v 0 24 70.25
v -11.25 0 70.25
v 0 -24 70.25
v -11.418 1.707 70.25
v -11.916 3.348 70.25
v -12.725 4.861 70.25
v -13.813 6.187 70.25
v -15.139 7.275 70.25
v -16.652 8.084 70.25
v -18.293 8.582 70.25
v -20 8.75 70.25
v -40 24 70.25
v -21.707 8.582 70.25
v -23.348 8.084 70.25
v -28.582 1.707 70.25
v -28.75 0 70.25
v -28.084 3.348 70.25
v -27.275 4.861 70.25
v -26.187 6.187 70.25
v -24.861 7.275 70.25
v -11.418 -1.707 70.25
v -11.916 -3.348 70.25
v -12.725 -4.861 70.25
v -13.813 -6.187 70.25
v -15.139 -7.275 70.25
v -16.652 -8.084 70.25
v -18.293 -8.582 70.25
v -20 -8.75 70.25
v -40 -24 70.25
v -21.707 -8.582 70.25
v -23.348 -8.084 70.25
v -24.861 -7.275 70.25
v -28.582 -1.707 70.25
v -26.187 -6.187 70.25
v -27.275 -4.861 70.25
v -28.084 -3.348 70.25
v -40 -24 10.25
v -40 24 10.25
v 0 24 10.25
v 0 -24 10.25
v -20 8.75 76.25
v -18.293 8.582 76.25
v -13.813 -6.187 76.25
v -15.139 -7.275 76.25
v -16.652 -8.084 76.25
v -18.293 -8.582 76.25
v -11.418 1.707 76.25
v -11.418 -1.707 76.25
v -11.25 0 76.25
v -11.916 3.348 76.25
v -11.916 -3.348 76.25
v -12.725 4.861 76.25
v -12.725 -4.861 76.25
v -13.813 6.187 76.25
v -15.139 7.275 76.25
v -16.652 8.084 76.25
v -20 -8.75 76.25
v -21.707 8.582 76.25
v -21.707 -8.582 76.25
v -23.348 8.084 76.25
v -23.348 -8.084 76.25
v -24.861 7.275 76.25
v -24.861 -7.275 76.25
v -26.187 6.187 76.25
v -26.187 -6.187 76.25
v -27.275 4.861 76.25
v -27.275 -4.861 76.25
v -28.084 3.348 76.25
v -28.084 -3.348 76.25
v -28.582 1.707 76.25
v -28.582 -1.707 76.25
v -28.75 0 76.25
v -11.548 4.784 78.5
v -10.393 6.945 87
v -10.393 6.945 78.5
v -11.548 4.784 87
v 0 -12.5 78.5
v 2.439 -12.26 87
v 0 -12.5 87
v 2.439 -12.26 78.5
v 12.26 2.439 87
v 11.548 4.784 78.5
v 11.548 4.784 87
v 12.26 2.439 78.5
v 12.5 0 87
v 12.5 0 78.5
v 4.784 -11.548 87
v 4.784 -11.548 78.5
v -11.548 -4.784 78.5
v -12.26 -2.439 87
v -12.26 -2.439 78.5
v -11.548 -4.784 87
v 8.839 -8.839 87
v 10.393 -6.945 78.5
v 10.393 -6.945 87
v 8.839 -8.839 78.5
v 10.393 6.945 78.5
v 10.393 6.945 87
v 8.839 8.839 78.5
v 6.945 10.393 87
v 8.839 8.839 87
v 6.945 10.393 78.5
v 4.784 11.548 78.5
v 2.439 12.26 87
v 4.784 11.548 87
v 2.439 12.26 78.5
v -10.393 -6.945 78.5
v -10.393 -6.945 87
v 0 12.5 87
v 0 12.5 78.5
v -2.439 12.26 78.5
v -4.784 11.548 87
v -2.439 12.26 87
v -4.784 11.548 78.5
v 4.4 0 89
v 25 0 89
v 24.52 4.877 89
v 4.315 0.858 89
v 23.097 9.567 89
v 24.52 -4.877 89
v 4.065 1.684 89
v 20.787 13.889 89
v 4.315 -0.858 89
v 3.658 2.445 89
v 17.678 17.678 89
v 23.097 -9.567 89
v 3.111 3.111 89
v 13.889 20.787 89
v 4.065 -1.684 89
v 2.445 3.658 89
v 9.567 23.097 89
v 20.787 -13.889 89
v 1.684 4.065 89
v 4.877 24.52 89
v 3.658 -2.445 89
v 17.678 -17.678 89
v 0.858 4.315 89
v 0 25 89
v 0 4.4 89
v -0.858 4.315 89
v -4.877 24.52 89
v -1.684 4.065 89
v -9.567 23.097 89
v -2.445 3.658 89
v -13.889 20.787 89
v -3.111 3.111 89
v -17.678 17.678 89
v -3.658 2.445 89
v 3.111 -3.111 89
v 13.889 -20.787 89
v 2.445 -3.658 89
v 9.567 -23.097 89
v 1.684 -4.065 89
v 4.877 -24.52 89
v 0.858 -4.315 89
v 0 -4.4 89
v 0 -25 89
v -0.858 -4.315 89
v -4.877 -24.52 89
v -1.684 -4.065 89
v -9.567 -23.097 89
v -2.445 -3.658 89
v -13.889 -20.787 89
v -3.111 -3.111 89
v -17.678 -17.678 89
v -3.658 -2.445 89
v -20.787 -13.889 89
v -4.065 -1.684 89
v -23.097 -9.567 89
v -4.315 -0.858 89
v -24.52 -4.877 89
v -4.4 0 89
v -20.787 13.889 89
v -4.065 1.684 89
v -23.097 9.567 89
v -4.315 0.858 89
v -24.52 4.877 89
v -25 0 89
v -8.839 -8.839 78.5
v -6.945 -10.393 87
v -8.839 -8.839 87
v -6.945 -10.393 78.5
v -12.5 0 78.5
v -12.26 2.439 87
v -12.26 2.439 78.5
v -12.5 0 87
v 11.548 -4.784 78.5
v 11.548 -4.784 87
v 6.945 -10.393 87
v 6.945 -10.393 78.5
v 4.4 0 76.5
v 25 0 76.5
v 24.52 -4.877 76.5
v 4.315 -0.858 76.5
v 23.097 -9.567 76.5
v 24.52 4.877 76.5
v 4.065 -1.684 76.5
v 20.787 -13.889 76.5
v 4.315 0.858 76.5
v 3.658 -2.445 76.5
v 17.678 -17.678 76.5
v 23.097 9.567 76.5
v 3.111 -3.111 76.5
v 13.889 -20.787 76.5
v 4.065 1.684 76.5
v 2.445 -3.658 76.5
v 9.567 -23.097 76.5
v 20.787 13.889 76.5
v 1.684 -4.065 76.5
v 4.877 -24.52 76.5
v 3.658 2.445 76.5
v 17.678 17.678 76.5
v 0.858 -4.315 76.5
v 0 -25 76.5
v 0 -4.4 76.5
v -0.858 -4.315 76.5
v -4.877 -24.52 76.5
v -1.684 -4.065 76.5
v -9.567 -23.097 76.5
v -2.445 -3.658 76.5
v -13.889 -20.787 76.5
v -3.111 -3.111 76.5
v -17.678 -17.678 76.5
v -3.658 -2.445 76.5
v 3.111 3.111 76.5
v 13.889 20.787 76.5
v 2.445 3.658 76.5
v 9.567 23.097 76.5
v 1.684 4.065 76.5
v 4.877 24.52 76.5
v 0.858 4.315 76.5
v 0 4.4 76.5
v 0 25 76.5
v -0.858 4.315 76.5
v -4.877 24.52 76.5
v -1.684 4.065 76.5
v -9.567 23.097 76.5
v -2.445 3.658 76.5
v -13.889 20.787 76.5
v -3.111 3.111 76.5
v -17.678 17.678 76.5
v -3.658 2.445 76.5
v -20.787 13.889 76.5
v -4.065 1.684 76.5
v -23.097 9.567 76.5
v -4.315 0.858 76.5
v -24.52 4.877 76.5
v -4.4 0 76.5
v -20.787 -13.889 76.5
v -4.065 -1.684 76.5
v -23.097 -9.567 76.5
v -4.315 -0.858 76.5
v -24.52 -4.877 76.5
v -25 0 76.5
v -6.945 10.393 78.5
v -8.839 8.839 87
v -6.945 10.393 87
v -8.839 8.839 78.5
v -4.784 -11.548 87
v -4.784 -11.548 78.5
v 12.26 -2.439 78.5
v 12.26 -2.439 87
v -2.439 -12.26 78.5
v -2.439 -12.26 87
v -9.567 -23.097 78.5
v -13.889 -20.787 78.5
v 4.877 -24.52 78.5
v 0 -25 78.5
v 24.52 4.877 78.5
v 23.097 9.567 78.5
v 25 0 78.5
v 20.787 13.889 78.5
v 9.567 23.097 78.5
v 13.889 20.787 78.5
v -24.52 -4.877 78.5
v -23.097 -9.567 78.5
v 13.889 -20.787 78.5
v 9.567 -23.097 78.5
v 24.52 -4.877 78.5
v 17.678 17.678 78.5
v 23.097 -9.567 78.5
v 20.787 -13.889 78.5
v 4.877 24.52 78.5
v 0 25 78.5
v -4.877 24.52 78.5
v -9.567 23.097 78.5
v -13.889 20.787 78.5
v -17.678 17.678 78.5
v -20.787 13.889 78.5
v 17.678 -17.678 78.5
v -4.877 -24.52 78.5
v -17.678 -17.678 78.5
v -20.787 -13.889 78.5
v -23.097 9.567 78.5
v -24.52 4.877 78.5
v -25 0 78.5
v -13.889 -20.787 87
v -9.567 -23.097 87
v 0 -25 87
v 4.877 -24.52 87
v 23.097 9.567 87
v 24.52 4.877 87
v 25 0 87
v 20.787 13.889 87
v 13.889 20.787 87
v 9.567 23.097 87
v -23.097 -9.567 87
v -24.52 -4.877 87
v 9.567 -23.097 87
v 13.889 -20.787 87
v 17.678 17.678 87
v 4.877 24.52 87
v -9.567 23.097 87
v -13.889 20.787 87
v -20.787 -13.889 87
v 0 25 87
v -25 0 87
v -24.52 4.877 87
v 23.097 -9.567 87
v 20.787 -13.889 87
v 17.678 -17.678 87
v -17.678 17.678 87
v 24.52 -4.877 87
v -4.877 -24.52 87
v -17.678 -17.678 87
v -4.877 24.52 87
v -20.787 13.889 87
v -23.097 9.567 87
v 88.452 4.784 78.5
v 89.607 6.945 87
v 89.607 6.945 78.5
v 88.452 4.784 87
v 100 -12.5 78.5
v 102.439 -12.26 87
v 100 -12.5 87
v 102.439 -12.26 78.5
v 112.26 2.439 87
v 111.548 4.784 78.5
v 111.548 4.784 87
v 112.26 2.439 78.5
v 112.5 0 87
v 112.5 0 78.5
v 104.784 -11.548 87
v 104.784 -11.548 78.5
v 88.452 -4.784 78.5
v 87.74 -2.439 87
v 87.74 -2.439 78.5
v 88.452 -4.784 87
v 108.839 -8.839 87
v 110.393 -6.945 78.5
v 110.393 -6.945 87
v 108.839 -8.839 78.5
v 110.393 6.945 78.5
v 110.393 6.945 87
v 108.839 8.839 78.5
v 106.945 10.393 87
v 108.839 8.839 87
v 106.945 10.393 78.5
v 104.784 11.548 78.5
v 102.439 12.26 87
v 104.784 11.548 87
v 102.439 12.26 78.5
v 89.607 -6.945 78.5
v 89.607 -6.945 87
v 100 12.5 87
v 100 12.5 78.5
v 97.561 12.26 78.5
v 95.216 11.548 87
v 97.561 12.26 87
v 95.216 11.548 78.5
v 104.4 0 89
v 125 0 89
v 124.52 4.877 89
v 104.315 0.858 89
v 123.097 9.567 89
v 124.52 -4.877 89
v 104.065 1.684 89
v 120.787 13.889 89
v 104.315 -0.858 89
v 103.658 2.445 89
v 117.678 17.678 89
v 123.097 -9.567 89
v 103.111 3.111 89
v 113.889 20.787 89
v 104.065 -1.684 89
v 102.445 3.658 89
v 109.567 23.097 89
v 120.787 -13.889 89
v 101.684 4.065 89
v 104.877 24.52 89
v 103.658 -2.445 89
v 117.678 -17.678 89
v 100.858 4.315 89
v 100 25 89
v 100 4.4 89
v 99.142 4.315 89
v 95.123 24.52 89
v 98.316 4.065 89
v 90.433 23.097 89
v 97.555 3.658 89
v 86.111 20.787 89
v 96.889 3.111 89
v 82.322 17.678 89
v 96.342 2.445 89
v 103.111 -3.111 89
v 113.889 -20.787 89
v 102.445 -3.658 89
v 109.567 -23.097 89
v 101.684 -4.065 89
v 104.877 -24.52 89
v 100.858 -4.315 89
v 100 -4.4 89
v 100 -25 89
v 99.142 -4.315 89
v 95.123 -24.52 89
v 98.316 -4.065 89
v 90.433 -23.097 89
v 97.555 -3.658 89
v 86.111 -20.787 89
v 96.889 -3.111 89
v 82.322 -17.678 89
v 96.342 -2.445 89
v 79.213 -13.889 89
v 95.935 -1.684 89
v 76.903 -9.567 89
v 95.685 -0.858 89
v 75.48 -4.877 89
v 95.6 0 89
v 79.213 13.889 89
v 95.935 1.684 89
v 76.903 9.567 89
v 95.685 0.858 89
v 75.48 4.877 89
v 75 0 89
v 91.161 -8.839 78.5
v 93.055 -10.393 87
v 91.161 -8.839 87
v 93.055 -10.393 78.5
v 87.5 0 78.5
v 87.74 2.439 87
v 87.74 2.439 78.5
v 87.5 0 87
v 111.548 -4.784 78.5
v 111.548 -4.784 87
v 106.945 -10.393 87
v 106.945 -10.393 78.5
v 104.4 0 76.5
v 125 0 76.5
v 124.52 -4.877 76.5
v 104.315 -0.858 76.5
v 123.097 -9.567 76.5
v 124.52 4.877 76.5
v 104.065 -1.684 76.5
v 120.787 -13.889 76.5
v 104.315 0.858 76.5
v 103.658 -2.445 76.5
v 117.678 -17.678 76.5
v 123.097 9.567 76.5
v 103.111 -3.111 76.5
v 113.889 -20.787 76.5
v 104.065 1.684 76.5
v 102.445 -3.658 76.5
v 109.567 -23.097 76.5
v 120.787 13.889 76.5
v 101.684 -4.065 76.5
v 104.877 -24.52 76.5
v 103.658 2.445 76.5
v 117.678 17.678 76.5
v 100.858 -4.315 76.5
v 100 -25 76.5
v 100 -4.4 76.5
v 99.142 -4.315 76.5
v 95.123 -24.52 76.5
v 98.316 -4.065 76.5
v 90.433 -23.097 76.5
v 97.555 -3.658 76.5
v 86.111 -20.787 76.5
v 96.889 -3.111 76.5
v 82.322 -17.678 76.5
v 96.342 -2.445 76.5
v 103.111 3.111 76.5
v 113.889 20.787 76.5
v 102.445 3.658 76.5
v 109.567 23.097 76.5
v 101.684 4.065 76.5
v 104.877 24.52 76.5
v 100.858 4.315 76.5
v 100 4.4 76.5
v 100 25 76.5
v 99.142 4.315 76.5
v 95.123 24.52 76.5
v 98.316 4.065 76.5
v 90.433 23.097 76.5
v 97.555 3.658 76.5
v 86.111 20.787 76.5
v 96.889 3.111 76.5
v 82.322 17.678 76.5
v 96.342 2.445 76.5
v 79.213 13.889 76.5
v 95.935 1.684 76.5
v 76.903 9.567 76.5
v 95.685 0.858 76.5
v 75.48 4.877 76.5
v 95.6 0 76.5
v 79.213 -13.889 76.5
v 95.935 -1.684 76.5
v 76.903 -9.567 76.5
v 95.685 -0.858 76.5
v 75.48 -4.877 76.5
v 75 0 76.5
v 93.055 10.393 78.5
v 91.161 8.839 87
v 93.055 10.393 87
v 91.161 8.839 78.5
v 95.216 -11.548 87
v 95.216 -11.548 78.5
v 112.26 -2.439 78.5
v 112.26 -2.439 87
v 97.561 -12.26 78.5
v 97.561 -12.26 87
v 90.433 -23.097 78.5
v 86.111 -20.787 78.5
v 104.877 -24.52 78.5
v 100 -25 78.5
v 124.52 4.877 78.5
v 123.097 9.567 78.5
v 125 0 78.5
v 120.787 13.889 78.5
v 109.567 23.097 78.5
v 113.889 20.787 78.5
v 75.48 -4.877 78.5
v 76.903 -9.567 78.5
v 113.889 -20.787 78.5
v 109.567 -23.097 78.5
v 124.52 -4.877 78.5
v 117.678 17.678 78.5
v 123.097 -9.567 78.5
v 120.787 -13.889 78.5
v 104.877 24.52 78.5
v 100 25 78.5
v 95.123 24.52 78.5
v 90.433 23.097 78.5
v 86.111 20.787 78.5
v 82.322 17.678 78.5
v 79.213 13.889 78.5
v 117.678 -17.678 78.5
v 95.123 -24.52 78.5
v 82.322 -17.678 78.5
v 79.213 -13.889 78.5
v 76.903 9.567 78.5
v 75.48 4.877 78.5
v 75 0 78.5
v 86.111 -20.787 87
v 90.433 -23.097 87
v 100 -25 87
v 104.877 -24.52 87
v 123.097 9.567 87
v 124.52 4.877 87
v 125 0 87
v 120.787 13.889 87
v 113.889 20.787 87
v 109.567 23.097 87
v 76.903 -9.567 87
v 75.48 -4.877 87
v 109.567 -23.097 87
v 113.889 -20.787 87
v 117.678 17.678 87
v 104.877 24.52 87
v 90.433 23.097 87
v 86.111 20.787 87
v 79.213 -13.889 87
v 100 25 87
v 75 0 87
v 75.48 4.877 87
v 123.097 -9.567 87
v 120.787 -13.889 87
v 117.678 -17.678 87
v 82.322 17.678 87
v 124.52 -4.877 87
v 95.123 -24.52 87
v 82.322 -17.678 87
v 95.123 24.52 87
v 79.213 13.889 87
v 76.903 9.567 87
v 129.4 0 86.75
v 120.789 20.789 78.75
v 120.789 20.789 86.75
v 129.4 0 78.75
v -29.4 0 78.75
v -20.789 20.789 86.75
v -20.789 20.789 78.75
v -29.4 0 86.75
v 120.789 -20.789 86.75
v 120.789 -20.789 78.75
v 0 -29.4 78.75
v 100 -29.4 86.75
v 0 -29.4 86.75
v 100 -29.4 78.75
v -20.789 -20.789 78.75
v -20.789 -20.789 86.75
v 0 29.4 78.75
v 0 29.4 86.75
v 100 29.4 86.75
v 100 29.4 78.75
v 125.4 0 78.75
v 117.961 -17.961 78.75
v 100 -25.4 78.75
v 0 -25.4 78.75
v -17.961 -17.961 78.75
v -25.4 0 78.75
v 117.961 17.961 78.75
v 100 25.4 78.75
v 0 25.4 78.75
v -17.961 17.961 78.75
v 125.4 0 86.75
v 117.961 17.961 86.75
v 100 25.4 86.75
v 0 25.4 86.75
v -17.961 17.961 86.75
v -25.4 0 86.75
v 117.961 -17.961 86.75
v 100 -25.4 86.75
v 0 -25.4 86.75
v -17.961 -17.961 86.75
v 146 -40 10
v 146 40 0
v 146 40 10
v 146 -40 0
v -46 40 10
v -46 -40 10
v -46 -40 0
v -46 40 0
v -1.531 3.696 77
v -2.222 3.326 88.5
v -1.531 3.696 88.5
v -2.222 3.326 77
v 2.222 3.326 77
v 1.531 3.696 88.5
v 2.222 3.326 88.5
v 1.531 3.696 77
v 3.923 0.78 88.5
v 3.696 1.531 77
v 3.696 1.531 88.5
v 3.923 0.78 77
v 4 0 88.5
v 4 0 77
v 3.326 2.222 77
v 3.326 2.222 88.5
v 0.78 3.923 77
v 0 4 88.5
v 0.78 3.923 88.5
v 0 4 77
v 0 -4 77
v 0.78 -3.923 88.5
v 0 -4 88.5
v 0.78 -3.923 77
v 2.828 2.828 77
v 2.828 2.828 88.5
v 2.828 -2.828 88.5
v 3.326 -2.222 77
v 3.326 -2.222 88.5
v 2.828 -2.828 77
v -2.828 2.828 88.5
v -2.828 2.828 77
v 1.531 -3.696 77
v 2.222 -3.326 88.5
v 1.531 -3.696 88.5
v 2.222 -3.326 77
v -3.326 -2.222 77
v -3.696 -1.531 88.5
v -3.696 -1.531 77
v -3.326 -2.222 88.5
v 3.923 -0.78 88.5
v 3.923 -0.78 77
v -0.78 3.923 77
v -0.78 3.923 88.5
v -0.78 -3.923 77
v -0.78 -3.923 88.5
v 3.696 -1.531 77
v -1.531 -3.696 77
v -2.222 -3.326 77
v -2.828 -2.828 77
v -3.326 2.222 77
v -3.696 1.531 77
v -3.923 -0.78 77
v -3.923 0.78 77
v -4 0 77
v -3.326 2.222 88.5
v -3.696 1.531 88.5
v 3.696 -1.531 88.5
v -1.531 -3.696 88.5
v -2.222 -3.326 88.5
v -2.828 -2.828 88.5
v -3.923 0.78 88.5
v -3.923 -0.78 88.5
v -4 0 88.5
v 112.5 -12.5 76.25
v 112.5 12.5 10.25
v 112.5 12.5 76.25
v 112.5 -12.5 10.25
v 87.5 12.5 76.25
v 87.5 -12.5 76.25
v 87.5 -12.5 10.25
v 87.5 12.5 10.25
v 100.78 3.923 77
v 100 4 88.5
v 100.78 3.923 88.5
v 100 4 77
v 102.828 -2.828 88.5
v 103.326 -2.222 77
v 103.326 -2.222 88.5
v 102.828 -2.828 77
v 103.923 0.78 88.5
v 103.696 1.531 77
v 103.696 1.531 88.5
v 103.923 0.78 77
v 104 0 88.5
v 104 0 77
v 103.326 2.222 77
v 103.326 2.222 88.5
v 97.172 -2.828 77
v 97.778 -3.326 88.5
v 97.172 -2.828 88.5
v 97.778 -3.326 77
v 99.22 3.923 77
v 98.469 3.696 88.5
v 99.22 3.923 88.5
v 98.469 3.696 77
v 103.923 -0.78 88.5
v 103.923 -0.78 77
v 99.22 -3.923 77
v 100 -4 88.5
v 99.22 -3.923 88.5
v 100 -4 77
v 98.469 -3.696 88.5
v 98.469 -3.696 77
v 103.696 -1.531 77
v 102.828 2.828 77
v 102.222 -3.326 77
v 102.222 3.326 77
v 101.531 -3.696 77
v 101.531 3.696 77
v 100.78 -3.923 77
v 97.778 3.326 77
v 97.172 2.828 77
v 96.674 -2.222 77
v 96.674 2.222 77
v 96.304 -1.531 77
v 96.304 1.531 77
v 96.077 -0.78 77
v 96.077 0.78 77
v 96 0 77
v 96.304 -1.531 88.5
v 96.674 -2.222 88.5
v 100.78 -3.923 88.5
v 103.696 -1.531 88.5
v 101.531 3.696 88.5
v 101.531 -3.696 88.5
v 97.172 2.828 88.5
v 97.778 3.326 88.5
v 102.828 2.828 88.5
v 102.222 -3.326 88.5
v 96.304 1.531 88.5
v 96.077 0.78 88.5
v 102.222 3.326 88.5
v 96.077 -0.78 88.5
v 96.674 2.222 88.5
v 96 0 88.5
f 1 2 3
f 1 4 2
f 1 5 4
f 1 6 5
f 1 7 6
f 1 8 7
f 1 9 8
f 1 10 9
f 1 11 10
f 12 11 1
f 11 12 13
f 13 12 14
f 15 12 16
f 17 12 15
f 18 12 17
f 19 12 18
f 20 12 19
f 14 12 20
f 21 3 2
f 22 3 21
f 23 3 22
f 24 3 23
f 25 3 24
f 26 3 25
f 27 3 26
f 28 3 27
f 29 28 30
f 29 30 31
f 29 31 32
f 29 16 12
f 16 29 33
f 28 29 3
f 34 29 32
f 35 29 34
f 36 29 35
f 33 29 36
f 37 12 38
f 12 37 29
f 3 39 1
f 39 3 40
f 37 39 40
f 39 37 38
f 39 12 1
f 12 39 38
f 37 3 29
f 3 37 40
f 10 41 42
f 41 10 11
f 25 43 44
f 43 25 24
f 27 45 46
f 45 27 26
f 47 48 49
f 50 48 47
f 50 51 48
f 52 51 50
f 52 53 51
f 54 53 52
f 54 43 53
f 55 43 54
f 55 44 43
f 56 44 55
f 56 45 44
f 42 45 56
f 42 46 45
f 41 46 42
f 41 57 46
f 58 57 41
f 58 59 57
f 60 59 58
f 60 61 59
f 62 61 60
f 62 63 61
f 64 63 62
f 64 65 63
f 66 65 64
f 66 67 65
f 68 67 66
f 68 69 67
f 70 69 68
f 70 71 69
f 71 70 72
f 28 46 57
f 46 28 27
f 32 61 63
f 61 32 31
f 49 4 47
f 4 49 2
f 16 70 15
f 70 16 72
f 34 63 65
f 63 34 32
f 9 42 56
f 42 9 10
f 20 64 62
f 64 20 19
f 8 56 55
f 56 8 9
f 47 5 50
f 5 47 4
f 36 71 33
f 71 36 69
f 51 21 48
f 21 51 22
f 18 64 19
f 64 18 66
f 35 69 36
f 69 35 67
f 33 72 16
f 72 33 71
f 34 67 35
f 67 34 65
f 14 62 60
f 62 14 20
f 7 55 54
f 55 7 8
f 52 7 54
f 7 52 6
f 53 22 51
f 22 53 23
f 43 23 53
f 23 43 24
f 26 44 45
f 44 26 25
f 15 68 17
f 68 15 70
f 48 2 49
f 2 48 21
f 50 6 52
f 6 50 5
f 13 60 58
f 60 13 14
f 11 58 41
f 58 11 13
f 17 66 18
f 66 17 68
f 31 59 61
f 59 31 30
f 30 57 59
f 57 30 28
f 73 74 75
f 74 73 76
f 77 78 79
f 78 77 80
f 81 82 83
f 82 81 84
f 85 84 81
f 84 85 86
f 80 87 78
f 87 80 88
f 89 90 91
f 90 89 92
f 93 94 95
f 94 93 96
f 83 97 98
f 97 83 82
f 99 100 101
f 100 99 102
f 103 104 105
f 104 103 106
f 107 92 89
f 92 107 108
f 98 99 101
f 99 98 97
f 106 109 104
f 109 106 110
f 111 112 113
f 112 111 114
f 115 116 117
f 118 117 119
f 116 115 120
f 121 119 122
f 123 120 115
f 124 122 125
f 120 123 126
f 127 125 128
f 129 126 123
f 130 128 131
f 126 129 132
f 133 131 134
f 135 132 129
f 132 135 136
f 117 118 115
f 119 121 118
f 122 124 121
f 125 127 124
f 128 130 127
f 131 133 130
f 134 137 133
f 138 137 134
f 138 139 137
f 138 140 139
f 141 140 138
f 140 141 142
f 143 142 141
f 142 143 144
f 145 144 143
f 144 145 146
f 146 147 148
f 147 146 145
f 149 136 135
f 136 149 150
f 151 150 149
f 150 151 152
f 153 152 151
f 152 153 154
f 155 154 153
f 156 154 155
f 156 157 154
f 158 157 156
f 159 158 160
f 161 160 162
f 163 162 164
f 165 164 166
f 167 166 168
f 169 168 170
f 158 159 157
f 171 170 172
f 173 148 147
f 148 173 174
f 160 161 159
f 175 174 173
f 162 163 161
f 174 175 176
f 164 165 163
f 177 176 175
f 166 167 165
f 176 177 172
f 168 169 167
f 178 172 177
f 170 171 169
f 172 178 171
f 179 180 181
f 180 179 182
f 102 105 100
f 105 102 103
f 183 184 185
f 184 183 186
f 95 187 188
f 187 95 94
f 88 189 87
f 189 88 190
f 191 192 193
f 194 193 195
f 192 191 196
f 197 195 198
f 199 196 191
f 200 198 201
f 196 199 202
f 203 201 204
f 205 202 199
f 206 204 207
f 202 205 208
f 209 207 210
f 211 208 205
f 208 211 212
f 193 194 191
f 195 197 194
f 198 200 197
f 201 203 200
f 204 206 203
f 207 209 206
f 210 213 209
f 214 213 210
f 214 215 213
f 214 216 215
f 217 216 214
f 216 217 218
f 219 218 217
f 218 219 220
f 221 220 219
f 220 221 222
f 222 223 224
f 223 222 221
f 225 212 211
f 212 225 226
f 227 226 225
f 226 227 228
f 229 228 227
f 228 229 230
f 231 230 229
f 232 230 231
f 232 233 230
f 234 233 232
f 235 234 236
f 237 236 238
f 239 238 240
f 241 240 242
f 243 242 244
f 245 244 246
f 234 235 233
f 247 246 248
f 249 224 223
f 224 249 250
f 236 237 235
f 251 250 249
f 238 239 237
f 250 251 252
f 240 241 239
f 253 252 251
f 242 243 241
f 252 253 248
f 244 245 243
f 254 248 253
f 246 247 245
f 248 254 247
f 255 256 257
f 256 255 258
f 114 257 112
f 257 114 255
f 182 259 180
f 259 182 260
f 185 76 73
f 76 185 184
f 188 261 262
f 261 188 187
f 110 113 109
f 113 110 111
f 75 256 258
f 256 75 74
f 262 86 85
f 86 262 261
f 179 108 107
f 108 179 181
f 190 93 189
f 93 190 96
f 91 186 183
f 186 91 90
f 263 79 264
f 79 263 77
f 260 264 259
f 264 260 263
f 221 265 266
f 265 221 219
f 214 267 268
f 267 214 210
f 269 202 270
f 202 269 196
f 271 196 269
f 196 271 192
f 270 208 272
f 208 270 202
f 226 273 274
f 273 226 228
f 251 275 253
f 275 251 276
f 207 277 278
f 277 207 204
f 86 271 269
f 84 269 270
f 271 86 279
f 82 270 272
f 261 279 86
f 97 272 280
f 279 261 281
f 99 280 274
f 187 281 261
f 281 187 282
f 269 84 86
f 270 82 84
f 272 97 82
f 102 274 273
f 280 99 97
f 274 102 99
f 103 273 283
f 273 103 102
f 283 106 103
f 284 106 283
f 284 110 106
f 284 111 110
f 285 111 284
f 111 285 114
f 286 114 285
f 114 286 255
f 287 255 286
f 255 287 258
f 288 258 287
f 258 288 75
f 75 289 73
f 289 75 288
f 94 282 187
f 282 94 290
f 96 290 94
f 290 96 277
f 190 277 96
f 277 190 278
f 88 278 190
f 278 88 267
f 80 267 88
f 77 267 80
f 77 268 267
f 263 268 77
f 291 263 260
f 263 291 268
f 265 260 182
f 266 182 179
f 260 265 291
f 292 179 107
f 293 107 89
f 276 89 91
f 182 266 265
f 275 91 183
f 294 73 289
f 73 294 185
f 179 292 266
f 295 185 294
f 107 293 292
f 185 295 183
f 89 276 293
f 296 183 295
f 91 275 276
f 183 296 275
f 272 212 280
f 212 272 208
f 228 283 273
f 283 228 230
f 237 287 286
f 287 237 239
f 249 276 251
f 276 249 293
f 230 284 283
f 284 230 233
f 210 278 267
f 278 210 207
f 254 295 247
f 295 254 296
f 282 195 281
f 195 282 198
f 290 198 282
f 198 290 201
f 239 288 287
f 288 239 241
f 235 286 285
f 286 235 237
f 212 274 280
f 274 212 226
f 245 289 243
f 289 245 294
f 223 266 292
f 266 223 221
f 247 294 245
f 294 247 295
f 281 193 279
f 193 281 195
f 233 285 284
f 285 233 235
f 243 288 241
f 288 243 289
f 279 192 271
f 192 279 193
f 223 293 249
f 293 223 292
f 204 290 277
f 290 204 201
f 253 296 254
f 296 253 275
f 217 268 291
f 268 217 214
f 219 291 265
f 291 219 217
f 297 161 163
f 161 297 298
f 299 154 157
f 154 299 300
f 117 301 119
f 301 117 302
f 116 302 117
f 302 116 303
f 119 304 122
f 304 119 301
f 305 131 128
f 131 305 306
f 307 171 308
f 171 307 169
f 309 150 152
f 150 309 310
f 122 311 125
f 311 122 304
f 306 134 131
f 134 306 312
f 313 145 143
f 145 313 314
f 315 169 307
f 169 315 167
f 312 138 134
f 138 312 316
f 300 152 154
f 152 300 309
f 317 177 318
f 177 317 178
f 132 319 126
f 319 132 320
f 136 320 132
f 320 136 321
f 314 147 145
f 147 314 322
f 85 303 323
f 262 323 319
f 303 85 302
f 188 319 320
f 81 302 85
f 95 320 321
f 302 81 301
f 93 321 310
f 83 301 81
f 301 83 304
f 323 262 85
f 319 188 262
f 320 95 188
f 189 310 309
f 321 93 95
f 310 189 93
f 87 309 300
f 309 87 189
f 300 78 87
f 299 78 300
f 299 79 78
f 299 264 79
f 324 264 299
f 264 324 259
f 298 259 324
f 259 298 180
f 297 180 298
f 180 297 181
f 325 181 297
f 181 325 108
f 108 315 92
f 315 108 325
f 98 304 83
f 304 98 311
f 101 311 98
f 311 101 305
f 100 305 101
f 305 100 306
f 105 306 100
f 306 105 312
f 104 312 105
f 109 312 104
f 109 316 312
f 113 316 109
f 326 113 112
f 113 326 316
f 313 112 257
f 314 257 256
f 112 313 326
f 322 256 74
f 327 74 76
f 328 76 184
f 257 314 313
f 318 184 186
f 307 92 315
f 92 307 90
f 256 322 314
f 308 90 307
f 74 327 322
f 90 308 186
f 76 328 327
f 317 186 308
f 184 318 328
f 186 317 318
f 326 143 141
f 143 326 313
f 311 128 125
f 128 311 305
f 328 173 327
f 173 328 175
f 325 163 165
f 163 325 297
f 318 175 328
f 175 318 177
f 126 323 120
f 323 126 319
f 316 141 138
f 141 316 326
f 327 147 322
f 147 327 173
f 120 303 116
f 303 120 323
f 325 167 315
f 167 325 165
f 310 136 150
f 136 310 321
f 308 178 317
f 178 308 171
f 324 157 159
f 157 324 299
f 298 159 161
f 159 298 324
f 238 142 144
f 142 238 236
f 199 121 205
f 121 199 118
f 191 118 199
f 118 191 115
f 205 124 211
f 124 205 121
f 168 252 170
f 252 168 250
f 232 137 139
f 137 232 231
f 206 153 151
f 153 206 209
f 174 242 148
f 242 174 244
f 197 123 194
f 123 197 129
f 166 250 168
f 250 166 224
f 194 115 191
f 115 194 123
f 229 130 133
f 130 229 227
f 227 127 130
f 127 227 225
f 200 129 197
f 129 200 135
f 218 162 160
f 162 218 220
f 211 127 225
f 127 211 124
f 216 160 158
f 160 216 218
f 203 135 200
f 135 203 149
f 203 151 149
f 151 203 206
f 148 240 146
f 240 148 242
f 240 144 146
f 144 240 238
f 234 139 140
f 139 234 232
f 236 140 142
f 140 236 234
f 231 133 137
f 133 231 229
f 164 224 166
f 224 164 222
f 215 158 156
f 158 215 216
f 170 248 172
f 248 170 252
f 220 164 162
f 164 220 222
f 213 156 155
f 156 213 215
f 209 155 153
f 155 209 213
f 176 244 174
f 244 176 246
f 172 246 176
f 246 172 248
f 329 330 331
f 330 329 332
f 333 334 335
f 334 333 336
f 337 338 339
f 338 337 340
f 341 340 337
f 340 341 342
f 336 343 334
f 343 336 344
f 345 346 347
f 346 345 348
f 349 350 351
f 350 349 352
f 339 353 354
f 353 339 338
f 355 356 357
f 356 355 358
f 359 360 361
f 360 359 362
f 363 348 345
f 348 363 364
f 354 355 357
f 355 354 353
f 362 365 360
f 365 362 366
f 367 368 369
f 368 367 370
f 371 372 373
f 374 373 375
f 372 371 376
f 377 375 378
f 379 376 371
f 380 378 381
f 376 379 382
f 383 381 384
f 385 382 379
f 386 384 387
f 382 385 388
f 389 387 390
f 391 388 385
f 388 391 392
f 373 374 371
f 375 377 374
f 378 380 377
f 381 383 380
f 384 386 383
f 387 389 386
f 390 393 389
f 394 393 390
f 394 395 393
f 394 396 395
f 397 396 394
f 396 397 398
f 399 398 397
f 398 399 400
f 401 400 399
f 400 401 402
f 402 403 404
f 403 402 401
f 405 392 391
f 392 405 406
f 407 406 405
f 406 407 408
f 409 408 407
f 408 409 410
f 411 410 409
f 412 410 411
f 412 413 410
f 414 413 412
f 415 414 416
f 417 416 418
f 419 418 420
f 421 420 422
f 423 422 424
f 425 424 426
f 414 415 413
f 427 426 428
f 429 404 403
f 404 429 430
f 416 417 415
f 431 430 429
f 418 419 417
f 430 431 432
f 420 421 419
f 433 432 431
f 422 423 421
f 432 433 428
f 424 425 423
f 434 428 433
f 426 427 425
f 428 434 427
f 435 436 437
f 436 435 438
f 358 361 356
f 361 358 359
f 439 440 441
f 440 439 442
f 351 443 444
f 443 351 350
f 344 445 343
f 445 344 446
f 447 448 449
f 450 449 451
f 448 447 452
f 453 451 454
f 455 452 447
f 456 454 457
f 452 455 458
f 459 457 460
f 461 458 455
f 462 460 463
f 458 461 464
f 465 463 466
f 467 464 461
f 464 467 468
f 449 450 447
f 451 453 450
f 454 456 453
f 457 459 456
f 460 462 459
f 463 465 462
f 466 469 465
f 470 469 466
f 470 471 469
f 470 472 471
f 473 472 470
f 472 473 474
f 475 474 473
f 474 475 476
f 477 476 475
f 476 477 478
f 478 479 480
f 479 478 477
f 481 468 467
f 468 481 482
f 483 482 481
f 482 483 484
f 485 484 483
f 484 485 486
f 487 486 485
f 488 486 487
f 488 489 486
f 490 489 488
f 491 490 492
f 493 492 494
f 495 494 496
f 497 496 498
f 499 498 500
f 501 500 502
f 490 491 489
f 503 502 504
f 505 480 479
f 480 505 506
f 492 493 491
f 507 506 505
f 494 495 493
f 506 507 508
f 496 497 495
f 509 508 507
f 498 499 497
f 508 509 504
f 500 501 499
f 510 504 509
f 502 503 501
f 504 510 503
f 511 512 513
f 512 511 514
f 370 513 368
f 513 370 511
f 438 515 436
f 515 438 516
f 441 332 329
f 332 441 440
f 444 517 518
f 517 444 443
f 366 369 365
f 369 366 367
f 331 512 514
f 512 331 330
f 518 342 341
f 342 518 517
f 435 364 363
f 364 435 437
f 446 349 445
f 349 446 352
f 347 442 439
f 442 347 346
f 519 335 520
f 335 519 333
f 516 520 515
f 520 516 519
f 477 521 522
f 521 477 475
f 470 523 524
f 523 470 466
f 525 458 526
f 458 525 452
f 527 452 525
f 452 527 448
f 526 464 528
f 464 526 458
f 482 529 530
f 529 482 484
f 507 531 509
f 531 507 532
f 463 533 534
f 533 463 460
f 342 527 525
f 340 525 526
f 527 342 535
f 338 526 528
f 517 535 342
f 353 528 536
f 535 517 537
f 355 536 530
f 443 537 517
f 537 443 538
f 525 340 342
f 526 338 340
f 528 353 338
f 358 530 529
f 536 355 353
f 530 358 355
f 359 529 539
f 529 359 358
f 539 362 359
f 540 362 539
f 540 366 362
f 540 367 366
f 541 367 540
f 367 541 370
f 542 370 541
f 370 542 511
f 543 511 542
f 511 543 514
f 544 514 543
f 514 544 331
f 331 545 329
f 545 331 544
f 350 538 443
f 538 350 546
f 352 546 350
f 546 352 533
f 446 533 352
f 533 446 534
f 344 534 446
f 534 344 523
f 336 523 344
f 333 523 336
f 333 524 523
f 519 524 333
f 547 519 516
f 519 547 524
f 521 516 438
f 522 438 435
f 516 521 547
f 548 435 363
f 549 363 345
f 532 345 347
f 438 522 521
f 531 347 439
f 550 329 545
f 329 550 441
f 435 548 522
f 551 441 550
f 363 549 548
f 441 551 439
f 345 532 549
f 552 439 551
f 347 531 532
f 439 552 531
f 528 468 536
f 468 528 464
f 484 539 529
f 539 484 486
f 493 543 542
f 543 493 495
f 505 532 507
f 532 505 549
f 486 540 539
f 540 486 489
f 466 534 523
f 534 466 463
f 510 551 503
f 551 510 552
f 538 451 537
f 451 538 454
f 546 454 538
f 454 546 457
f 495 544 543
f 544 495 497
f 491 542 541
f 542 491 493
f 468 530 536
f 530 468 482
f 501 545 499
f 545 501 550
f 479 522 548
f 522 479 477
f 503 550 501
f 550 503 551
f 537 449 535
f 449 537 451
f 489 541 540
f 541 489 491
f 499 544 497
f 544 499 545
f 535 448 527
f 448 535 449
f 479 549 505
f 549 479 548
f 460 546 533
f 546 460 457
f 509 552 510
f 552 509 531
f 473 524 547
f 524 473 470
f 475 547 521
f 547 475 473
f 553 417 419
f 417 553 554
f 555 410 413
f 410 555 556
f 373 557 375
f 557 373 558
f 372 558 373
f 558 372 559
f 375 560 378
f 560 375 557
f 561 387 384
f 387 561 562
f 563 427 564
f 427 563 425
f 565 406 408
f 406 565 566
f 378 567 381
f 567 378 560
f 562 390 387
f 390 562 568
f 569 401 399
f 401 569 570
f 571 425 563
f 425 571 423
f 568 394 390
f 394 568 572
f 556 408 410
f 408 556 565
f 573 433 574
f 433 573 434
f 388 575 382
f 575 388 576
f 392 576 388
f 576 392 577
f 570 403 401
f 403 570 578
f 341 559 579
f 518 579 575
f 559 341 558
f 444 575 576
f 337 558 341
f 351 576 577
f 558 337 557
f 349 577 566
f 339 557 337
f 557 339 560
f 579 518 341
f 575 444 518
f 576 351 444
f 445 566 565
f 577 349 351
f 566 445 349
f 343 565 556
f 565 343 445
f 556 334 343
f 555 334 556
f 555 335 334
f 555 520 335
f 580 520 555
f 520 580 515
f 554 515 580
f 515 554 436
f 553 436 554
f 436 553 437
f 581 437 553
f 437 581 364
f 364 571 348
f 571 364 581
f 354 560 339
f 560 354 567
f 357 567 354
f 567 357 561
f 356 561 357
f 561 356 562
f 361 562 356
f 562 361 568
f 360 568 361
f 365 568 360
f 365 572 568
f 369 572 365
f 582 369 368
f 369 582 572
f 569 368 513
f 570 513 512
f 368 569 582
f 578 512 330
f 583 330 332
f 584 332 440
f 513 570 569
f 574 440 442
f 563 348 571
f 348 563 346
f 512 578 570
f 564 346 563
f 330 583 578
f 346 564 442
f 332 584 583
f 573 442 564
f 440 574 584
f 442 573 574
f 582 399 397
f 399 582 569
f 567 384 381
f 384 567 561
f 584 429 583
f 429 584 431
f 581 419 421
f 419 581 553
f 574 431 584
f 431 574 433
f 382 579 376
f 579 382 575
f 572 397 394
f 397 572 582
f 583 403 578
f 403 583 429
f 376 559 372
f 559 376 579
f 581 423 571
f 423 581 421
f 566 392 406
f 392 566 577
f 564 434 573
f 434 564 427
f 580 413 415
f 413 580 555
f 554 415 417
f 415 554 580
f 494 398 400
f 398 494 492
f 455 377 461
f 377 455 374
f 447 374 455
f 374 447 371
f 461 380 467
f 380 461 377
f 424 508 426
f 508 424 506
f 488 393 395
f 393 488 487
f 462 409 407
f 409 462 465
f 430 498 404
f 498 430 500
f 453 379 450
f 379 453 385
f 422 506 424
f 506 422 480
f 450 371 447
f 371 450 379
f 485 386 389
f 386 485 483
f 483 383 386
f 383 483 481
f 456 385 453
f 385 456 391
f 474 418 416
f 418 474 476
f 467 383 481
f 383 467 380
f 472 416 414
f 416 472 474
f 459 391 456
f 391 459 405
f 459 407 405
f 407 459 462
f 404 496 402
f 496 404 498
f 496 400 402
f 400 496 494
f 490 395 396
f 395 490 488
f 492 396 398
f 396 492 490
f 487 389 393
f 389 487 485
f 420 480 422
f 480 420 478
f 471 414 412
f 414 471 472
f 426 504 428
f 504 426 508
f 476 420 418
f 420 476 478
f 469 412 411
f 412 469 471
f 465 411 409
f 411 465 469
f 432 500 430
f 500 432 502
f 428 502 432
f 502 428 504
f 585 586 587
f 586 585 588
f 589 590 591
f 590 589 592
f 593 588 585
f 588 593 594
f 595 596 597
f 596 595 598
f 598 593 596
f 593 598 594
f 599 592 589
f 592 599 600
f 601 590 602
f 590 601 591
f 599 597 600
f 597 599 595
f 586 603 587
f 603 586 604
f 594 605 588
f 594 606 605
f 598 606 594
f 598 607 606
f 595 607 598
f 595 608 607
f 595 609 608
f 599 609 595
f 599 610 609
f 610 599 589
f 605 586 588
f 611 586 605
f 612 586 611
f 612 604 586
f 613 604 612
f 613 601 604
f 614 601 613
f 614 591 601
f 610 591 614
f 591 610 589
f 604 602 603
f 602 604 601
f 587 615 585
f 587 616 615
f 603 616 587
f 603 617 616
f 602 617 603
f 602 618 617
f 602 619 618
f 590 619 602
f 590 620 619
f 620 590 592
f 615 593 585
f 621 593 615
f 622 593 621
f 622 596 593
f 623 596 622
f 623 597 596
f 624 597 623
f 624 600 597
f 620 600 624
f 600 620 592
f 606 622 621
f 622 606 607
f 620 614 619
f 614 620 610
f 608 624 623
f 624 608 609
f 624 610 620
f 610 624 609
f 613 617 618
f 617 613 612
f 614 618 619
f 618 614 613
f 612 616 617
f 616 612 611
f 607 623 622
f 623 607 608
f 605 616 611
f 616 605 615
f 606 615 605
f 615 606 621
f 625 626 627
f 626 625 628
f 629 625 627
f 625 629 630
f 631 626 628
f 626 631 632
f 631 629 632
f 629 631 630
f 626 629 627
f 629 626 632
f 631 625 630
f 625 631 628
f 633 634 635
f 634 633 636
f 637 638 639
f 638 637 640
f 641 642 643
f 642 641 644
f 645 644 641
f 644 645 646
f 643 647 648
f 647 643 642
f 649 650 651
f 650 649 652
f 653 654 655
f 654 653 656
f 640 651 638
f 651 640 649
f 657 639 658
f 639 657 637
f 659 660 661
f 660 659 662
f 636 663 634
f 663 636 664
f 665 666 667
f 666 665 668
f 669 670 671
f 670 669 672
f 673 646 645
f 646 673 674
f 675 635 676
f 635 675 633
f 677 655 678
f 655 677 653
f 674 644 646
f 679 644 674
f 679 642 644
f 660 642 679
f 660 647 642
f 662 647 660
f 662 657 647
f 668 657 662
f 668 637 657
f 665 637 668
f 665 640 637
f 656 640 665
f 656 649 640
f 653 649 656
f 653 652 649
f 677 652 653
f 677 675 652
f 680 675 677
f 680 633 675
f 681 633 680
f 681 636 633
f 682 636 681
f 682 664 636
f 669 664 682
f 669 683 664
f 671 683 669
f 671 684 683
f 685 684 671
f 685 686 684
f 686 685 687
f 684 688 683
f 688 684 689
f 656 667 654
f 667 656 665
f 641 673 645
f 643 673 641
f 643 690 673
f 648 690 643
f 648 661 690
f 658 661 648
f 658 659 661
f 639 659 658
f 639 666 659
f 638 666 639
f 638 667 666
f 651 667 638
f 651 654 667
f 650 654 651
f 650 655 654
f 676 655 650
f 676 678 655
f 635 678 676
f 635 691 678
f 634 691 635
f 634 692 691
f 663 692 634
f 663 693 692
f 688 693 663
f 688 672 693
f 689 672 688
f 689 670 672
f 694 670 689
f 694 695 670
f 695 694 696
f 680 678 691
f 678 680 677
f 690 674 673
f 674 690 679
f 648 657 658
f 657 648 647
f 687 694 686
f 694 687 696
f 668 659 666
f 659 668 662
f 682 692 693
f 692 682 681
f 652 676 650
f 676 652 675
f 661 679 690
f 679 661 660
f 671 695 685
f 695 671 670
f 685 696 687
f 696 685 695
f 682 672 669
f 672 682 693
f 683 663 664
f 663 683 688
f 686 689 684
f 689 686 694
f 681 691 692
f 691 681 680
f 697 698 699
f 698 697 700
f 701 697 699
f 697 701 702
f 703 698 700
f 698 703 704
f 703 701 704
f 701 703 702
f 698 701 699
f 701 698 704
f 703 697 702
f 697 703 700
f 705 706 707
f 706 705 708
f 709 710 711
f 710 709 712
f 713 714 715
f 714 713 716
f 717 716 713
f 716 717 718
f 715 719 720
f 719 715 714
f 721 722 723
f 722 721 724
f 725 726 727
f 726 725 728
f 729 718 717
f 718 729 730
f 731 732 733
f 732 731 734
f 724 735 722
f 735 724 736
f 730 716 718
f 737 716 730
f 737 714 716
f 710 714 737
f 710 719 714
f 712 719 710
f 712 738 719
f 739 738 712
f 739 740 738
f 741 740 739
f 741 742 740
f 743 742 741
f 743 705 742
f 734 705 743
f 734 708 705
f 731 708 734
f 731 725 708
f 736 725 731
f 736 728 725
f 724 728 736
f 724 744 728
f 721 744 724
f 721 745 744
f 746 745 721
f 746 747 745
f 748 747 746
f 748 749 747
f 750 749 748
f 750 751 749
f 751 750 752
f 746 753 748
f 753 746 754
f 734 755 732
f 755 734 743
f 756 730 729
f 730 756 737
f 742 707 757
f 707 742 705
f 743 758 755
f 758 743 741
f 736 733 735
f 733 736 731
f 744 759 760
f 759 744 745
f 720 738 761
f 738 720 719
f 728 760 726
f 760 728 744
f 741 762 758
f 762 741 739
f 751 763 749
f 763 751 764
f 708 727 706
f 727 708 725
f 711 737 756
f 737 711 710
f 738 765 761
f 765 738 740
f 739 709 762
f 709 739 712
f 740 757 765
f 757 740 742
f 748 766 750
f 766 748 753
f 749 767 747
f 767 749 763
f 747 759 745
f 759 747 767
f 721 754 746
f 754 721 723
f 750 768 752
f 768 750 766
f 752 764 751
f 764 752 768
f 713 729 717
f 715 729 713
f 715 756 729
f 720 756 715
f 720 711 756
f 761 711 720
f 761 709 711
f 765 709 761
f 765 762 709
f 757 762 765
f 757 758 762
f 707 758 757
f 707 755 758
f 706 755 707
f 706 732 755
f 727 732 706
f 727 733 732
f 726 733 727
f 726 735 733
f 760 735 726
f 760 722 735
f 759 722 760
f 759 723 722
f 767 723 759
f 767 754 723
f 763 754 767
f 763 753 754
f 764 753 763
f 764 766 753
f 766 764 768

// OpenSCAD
$fn = 32;

// ------------------------------------------------------------------------
// Motor belt drive: span 100 mm, pulleys d50, belt 8 mm wide
// Every part is its own module, assembly() places every instance.
// ------------------------------------------------------------------------

// --- part 1 ---
module base_plate() {
  difference() {
    translate([-96, -40, 0]) cube([192, 80, 10]);
  }
}

// --- part 2 ---
module motor() {
  union() {
    translate([-30, -24, 0]) cube([60, 48, 40]);
    translate([33, 0, 20]) rotate([0, 90, 0]) cylinder(h = 6, d = 17.5, center = true);
  }
}

// --- part 3 ---
module drive_shaft() {
  translate([0, 0, -5.75]) cylinder(h = 11.5, d = 8);
}

// --- part 4 ---
module pulley_drive() {
  difference() {
    union() {
      cylinder(h = 12.5, d = 25);
      cylinder(h = 2, d = 50);
      translate([0, 0, 10.5]) cylinder(h = 2, d = 50);
    }
    translate([0, 0, -1]) cylinder(h = 14.5, d = 8.8);
  }
}

// --- part 5 ---
module idler_post() {
  translate([-12.5, -12.5, 0]) cube([25, 25, 66]);
}

// --- part 6 ---
module driven_shaft() {
  translate([0, 0, -5.75]) cylinder(h = 11.5, d = 8);
}

// --- part 7 ---
module pulley_driven() {
  difference() {
    union() {
      cylinder(h = 12.5, d = 25);
      cylinder(h = 2, d = 50);
      translate([0, 0, 10.5]) cylinder(h = 2, d = 50);
    }
    translate([0, 0, -1]) cylinder(h = 14.5, d = 8.8);
  }
}

// --- part 8 ---
module drive_belt() {
  difference() {
    linear_extrude(height = 8) polygon(points = concat([for (a = [90 : 45 : 270]) [29.4 * cos(a), 29.4 * sin(a)]], [for (a = [270 : 45 : 450]) [100 + 29.4 * cos(a), 29.4 * sin(a)]]));
    translate([0, 0, -1]) linear_extrude(height = 10) polygon(points = concat([for (a = [90 : 45 : 270]) [25.4 * cos(a), 25.4 * sin(a)]], [for (a = [270 : 45 : 450]) [100 + 25.4 * cos(a), 25.4 * sin(a)]]));
  }
}

// --- assembly ---
module assembly() {
  color([0.80, 0.24, 0.20]) translate([50, 0, 0]) rotate([0, 0, 0]) base_plate();
  color([0.20, 0.45, 0.75]) translate([0, 0, 40.25]) rotate([0, 270, 0]) motor();
  color([0.25, 0.62, 0.32]) translate([0, 0, 82.75]) rotate([0, 0, 0]) drive_shaft();
  color([0.92, 0.70, 0.18]) translate([0, 0, 76.5]) rotate([0, 0, 0]) pulley_drive();
  color([0.58, 0.35, 0.70]) translate([100, 0, 10.25]) rotate([0, 0, 0]) idler_post();
  color([0.16, 0.66, 0.66]) translate([100, 0, 82.75]) rotate([0, 0, 0]) driven_shaft();
  color([0.85, 0.48, 0.18]) translate([100, 0, 76.5]) rotate([0, 0, 0]) pulley_driven();
  color([0.55, 0.60, 0.65]) translate([0, 0, 78.75]) rotate([0, 0, 0]) drive_belt();
}

assembly();
